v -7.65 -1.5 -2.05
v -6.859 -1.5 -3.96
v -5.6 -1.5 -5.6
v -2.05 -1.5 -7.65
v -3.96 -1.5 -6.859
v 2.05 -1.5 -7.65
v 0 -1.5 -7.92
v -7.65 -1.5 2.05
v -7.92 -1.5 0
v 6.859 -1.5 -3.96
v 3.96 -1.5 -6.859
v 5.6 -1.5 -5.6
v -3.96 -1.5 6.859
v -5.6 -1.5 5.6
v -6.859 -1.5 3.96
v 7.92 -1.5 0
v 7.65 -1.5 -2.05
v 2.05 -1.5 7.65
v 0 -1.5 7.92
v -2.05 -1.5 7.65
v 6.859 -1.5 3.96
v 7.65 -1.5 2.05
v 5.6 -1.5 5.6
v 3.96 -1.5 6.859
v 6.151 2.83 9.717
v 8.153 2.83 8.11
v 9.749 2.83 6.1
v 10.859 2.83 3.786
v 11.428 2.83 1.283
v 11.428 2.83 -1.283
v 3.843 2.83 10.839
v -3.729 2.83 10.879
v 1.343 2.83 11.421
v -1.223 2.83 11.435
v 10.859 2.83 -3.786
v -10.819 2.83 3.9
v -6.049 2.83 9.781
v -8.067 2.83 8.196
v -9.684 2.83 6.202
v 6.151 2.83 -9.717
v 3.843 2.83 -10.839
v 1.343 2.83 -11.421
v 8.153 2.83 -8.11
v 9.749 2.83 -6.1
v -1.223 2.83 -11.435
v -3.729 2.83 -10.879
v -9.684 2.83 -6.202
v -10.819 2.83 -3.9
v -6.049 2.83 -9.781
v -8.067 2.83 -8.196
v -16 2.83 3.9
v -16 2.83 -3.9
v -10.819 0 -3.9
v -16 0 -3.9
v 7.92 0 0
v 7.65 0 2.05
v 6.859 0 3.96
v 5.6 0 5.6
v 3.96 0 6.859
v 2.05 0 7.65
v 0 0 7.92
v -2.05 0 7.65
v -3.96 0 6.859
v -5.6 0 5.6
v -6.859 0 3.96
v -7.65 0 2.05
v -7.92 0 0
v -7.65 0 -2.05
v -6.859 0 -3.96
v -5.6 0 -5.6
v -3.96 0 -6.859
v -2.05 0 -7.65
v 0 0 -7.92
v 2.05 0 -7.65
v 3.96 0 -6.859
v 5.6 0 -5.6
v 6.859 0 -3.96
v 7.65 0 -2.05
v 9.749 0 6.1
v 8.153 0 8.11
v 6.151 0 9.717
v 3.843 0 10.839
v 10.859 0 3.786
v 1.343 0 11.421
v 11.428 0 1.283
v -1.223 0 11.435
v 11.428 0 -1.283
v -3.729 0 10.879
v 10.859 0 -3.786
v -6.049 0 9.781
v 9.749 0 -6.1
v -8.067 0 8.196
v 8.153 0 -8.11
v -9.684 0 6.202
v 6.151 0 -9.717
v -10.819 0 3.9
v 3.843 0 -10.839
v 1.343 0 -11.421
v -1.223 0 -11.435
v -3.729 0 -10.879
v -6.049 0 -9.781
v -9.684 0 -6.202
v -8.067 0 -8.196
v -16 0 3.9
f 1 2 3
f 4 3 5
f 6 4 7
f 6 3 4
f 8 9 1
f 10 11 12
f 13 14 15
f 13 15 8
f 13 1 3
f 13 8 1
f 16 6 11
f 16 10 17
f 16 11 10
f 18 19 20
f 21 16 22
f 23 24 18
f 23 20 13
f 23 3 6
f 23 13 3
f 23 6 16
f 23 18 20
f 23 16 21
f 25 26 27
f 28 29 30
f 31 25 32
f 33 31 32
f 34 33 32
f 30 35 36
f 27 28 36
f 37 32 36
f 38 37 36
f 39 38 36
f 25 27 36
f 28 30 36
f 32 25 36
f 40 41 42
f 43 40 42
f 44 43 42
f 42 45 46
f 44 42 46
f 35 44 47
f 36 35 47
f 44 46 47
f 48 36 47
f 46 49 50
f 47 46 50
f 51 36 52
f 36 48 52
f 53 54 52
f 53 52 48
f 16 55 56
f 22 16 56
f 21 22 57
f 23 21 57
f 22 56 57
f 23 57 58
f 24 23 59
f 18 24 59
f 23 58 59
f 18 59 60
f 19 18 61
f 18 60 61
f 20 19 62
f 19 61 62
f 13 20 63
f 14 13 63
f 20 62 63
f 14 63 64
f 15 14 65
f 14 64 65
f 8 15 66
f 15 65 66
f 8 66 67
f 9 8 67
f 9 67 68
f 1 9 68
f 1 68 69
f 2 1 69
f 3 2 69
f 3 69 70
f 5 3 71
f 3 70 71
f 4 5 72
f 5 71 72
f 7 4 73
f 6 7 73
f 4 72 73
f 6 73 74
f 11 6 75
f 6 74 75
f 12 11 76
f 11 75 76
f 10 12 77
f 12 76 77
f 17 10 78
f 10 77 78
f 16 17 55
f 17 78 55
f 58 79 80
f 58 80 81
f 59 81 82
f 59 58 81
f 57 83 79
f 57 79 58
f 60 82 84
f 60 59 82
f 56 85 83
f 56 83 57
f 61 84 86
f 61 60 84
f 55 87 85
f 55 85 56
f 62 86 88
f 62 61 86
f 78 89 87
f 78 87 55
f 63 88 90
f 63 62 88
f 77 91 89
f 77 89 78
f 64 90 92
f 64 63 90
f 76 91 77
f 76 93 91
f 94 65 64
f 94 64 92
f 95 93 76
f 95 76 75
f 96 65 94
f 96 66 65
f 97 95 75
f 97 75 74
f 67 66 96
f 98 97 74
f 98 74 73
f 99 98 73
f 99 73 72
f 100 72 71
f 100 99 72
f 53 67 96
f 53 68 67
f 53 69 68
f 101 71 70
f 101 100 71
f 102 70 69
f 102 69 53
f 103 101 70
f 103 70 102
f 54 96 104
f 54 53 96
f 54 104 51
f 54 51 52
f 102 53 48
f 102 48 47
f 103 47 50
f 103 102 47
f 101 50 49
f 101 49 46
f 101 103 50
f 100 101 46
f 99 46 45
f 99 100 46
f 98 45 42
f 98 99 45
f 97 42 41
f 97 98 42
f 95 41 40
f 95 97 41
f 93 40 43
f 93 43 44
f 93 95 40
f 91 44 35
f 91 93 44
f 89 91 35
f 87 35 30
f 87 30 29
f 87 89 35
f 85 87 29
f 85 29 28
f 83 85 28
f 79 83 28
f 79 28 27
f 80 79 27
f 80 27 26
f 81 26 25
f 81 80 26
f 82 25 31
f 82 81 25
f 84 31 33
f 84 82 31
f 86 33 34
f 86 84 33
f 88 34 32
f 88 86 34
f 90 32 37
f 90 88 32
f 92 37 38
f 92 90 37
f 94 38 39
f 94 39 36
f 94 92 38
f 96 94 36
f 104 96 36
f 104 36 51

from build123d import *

# Parameters (mm, degrees)
EXTRUDE_1_DEPTH = 2.83
SKETCH_2_R      = 7.92
EXTRUDE_2_DEPTH = 1.5


with BuildPart() as part:
    # 草图1 → 凸台-拉伸1 (new body)
    with BuildSketch(Plane(origin=(0, 0, 0), x_dir=(1, 0, 0), z_dir=(0, 1, 0))):
        with BuildLine():
            Line((-16, 3.9), (-10.818502669, 3.9))
            ThreePointArc((-10.818502669, 3.9), (11.5, 0), (-10.818502669, -3.9))
            Line((-10.818502669, -3.9), (-16, -3.9))
            Line((-16, -3.9), (-16, 3.9))
        make_face()
    extrude(amount=EXTRUDE_1_DEPTH)

    # 草图2 → 凸台-拉伸2 (add)
    with BuildSketch(Plane.XZ):
        Circle(SKETCH_2_R)
    extrude(amount=EXTRUDE_2_DEPTH)


solid = part.part
